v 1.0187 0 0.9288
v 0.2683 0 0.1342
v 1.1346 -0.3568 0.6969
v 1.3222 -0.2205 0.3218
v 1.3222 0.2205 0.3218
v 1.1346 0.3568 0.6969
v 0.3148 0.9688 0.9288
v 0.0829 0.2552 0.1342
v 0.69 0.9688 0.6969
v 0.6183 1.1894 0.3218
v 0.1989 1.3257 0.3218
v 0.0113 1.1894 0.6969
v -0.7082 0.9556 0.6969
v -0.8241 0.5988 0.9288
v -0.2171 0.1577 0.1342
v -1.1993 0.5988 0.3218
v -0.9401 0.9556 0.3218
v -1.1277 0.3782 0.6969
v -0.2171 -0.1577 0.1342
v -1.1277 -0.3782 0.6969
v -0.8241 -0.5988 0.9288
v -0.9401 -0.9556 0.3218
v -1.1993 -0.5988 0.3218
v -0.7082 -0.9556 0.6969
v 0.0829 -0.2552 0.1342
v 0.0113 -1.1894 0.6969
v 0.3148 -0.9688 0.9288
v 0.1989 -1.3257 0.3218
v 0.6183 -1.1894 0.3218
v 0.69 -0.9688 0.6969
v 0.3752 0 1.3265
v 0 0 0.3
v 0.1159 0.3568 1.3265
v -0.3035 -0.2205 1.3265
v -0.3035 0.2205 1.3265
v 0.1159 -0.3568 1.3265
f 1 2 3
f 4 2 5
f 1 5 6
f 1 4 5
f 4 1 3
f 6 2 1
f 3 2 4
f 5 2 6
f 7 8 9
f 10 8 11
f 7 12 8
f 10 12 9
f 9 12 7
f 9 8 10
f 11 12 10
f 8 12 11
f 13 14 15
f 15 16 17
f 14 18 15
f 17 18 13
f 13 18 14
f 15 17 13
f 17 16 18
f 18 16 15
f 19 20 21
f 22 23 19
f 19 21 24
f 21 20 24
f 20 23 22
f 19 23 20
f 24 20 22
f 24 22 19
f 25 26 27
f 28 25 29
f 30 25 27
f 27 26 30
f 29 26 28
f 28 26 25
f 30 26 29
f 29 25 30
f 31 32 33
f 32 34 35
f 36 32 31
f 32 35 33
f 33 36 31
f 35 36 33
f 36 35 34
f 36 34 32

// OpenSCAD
module cells() {
  r = sqrt(3 / (1 + 2*sqrt(5)/5) - 1);
  % for (j = [0, 180]) rotate([0, j, 0])
    for (i = [0:4]) rotate([0, 0, i * 360 / 5])
      for (k = [0, 1])
        rotate([0, -atan(r) - 2*k*atan(r*cos(180/3)), 0])
        rotate([0, 0, 180*k])
        rotate([0, 0, 30])
          translate([0, 0, 0.3]) cylinder(1, 0, r/sqrt(3), $fn=6);

  y = cos(atan(r)) + r/2 * sin(atan(r));
  nr = sqrt(1 + r*r/4 - y*y) / cos(36);
  translate([0, 0, 0.3]) cylinder(y, 0, nr, $fn=5);
  for (i = [0:4]) rotate ([0, 0, i * 72])
  rotate([0, 2*atan(r*cos(180/5)), 0])
  rotate([0, 0, 180]) translate([0, 0, 0.3]) cylinder(y, 0, nr, $fn=5);
}

cells();
